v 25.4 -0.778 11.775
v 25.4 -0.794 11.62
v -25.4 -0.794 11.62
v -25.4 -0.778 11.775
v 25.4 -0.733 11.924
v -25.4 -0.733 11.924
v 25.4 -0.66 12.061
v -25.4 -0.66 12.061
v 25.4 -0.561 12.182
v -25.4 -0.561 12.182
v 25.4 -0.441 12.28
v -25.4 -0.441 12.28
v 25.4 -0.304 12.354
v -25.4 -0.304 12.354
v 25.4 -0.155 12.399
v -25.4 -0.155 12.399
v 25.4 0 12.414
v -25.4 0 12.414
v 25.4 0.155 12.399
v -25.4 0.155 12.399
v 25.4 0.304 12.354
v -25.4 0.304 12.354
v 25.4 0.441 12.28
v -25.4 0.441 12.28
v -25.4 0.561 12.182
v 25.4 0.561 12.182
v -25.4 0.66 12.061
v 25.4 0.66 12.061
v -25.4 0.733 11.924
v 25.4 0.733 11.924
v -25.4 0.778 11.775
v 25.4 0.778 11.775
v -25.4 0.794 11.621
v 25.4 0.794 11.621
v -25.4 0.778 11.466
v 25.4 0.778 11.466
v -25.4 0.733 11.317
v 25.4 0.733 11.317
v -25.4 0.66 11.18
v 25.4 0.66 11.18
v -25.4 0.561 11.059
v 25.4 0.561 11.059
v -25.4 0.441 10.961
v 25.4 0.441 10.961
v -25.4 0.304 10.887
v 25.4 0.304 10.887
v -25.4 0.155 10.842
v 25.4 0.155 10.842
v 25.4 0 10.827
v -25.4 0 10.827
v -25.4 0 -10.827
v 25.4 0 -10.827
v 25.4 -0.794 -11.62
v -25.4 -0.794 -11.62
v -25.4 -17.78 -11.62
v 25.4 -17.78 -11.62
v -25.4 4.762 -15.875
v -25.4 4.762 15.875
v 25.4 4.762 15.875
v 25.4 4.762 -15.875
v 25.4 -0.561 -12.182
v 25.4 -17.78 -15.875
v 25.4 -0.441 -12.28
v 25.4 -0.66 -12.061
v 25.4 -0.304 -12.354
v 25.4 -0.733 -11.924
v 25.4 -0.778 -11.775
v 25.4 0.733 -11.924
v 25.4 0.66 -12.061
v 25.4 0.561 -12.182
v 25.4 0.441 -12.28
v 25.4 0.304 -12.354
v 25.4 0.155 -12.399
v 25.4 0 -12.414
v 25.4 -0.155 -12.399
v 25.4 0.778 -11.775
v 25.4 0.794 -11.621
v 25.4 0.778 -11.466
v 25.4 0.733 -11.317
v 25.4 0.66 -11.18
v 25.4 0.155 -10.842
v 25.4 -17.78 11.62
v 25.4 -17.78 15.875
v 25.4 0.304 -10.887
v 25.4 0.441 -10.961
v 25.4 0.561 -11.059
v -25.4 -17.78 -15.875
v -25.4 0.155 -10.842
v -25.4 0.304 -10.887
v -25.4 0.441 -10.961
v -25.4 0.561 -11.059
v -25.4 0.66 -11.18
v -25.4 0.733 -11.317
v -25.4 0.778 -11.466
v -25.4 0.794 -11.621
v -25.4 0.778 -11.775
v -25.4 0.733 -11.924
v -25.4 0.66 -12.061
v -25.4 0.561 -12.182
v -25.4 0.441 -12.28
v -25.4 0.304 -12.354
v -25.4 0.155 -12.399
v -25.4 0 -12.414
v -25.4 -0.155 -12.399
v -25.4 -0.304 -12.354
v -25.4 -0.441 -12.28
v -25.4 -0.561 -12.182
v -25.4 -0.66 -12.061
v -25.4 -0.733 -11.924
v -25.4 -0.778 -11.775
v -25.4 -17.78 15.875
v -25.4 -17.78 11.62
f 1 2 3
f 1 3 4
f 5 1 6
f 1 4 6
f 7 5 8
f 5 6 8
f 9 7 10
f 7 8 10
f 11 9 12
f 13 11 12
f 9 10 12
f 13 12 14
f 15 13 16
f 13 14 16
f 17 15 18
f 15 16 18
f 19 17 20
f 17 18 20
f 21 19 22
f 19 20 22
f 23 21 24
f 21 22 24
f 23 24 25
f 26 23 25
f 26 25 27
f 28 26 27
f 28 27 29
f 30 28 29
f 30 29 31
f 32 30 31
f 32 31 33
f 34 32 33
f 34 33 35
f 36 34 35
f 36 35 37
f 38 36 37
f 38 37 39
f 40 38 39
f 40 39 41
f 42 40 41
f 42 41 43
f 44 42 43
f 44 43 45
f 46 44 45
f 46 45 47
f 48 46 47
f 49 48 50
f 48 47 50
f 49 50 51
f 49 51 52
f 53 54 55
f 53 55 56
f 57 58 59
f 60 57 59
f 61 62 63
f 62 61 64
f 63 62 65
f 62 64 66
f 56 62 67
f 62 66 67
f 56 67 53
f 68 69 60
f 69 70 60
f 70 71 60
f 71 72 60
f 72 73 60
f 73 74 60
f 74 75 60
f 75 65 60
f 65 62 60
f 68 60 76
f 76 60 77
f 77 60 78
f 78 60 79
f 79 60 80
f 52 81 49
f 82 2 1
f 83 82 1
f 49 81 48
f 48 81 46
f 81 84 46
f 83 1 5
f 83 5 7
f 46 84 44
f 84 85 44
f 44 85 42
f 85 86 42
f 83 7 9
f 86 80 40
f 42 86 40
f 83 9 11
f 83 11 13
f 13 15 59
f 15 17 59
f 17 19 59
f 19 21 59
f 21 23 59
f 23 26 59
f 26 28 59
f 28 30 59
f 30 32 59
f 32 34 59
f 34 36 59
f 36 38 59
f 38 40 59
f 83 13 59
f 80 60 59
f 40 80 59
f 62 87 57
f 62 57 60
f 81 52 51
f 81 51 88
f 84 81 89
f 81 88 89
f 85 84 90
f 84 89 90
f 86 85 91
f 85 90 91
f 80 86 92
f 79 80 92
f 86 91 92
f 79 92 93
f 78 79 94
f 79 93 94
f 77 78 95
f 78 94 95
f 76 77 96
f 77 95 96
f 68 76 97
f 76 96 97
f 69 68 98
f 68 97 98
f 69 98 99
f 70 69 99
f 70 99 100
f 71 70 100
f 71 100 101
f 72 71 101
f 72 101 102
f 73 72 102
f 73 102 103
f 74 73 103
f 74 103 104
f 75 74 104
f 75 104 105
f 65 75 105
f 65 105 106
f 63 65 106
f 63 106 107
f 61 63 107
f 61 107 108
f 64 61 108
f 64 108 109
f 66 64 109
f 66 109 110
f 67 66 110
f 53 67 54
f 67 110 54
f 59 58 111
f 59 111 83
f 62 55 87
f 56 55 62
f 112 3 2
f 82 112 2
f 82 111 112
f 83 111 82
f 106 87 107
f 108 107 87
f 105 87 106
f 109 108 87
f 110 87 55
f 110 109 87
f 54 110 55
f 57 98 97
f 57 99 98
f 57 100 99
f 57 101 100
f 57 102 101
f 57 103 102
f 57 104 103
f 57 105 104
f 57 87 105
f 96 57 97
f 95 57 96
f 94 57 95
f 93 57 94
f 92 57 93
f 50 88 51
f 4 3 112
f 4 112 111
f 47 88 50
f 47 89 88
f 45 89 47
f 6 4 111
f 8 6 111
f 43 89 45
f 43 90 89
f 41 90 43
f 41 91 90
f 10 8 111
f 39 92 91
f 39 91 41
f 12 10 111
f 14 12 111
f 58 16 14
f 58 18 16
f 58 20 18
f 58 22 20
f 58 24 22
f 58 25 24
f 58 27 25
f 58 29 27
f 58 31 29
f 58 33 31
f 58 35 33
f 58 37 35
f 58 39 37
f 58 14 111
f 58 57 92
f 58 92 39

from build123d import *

# Parameters (mm, degrees)
F0_W     = 50.8
F0_H     = 4.2545
F0_H_2   = 23.241
F1_DEPTH = 4.7625
F2_DEPTH = 17.78
F4_DEPTH = 50.801


with BuildPart() as f1:
    # F0 (on Front) → F1 (new body)
    with BuildSketch(Plane.XZ):
        with Locations((0, 13.74775)):
            Rectangle(F0_W, F0_H)
        Rectangle(F0_W, F0_H_2)
        with Locations((0, -13.74775)):
            Rectangle(F0_W, F0_H)
    extrude(amount=-F1_DEPTH)

    # F0 (on Front) → F2 (join)
    with BuildSketch(Plane.XZ):
        with Locations((0, 13.74775)):
            Rectangle(F0_W, F0_H)
        with Locations((0, -13.74775)):
            Rectangle(F0_W, F0_H)
    extrude(amount=F2_DEPTH)

    # F3 (on face) → F4 (cut, through all)
    with BuildSketch(Plane(origin=(-25.4, 0, 0), x_dir=(0, -1, 0), z_dir=(-1, 0, 0))):
        with BuildLine():
            Line((0, 11.6205), (0.79375, 11.6205))
            ThreePointArc((0.79375, 11.6205), (-0.5612660076, 12.1817660076), (0, 10.82675))
            Line((0, 10.82675), (0, 11.6205))
        make_face()
        with BuildLine():
            Line((0, -11.6205), (0, -10.82675))
            ThreePointArc((0, -10.82675), (-0.5612660076, -12.1817660076), (0.79375, -11.6205))
            Line((0.79375, -11.6205), (0, -11.6205))
        make_face()
    extrude(amount=-F4_DEPTH, mode=Mode.SUBTRACT)


solid = f1.part
